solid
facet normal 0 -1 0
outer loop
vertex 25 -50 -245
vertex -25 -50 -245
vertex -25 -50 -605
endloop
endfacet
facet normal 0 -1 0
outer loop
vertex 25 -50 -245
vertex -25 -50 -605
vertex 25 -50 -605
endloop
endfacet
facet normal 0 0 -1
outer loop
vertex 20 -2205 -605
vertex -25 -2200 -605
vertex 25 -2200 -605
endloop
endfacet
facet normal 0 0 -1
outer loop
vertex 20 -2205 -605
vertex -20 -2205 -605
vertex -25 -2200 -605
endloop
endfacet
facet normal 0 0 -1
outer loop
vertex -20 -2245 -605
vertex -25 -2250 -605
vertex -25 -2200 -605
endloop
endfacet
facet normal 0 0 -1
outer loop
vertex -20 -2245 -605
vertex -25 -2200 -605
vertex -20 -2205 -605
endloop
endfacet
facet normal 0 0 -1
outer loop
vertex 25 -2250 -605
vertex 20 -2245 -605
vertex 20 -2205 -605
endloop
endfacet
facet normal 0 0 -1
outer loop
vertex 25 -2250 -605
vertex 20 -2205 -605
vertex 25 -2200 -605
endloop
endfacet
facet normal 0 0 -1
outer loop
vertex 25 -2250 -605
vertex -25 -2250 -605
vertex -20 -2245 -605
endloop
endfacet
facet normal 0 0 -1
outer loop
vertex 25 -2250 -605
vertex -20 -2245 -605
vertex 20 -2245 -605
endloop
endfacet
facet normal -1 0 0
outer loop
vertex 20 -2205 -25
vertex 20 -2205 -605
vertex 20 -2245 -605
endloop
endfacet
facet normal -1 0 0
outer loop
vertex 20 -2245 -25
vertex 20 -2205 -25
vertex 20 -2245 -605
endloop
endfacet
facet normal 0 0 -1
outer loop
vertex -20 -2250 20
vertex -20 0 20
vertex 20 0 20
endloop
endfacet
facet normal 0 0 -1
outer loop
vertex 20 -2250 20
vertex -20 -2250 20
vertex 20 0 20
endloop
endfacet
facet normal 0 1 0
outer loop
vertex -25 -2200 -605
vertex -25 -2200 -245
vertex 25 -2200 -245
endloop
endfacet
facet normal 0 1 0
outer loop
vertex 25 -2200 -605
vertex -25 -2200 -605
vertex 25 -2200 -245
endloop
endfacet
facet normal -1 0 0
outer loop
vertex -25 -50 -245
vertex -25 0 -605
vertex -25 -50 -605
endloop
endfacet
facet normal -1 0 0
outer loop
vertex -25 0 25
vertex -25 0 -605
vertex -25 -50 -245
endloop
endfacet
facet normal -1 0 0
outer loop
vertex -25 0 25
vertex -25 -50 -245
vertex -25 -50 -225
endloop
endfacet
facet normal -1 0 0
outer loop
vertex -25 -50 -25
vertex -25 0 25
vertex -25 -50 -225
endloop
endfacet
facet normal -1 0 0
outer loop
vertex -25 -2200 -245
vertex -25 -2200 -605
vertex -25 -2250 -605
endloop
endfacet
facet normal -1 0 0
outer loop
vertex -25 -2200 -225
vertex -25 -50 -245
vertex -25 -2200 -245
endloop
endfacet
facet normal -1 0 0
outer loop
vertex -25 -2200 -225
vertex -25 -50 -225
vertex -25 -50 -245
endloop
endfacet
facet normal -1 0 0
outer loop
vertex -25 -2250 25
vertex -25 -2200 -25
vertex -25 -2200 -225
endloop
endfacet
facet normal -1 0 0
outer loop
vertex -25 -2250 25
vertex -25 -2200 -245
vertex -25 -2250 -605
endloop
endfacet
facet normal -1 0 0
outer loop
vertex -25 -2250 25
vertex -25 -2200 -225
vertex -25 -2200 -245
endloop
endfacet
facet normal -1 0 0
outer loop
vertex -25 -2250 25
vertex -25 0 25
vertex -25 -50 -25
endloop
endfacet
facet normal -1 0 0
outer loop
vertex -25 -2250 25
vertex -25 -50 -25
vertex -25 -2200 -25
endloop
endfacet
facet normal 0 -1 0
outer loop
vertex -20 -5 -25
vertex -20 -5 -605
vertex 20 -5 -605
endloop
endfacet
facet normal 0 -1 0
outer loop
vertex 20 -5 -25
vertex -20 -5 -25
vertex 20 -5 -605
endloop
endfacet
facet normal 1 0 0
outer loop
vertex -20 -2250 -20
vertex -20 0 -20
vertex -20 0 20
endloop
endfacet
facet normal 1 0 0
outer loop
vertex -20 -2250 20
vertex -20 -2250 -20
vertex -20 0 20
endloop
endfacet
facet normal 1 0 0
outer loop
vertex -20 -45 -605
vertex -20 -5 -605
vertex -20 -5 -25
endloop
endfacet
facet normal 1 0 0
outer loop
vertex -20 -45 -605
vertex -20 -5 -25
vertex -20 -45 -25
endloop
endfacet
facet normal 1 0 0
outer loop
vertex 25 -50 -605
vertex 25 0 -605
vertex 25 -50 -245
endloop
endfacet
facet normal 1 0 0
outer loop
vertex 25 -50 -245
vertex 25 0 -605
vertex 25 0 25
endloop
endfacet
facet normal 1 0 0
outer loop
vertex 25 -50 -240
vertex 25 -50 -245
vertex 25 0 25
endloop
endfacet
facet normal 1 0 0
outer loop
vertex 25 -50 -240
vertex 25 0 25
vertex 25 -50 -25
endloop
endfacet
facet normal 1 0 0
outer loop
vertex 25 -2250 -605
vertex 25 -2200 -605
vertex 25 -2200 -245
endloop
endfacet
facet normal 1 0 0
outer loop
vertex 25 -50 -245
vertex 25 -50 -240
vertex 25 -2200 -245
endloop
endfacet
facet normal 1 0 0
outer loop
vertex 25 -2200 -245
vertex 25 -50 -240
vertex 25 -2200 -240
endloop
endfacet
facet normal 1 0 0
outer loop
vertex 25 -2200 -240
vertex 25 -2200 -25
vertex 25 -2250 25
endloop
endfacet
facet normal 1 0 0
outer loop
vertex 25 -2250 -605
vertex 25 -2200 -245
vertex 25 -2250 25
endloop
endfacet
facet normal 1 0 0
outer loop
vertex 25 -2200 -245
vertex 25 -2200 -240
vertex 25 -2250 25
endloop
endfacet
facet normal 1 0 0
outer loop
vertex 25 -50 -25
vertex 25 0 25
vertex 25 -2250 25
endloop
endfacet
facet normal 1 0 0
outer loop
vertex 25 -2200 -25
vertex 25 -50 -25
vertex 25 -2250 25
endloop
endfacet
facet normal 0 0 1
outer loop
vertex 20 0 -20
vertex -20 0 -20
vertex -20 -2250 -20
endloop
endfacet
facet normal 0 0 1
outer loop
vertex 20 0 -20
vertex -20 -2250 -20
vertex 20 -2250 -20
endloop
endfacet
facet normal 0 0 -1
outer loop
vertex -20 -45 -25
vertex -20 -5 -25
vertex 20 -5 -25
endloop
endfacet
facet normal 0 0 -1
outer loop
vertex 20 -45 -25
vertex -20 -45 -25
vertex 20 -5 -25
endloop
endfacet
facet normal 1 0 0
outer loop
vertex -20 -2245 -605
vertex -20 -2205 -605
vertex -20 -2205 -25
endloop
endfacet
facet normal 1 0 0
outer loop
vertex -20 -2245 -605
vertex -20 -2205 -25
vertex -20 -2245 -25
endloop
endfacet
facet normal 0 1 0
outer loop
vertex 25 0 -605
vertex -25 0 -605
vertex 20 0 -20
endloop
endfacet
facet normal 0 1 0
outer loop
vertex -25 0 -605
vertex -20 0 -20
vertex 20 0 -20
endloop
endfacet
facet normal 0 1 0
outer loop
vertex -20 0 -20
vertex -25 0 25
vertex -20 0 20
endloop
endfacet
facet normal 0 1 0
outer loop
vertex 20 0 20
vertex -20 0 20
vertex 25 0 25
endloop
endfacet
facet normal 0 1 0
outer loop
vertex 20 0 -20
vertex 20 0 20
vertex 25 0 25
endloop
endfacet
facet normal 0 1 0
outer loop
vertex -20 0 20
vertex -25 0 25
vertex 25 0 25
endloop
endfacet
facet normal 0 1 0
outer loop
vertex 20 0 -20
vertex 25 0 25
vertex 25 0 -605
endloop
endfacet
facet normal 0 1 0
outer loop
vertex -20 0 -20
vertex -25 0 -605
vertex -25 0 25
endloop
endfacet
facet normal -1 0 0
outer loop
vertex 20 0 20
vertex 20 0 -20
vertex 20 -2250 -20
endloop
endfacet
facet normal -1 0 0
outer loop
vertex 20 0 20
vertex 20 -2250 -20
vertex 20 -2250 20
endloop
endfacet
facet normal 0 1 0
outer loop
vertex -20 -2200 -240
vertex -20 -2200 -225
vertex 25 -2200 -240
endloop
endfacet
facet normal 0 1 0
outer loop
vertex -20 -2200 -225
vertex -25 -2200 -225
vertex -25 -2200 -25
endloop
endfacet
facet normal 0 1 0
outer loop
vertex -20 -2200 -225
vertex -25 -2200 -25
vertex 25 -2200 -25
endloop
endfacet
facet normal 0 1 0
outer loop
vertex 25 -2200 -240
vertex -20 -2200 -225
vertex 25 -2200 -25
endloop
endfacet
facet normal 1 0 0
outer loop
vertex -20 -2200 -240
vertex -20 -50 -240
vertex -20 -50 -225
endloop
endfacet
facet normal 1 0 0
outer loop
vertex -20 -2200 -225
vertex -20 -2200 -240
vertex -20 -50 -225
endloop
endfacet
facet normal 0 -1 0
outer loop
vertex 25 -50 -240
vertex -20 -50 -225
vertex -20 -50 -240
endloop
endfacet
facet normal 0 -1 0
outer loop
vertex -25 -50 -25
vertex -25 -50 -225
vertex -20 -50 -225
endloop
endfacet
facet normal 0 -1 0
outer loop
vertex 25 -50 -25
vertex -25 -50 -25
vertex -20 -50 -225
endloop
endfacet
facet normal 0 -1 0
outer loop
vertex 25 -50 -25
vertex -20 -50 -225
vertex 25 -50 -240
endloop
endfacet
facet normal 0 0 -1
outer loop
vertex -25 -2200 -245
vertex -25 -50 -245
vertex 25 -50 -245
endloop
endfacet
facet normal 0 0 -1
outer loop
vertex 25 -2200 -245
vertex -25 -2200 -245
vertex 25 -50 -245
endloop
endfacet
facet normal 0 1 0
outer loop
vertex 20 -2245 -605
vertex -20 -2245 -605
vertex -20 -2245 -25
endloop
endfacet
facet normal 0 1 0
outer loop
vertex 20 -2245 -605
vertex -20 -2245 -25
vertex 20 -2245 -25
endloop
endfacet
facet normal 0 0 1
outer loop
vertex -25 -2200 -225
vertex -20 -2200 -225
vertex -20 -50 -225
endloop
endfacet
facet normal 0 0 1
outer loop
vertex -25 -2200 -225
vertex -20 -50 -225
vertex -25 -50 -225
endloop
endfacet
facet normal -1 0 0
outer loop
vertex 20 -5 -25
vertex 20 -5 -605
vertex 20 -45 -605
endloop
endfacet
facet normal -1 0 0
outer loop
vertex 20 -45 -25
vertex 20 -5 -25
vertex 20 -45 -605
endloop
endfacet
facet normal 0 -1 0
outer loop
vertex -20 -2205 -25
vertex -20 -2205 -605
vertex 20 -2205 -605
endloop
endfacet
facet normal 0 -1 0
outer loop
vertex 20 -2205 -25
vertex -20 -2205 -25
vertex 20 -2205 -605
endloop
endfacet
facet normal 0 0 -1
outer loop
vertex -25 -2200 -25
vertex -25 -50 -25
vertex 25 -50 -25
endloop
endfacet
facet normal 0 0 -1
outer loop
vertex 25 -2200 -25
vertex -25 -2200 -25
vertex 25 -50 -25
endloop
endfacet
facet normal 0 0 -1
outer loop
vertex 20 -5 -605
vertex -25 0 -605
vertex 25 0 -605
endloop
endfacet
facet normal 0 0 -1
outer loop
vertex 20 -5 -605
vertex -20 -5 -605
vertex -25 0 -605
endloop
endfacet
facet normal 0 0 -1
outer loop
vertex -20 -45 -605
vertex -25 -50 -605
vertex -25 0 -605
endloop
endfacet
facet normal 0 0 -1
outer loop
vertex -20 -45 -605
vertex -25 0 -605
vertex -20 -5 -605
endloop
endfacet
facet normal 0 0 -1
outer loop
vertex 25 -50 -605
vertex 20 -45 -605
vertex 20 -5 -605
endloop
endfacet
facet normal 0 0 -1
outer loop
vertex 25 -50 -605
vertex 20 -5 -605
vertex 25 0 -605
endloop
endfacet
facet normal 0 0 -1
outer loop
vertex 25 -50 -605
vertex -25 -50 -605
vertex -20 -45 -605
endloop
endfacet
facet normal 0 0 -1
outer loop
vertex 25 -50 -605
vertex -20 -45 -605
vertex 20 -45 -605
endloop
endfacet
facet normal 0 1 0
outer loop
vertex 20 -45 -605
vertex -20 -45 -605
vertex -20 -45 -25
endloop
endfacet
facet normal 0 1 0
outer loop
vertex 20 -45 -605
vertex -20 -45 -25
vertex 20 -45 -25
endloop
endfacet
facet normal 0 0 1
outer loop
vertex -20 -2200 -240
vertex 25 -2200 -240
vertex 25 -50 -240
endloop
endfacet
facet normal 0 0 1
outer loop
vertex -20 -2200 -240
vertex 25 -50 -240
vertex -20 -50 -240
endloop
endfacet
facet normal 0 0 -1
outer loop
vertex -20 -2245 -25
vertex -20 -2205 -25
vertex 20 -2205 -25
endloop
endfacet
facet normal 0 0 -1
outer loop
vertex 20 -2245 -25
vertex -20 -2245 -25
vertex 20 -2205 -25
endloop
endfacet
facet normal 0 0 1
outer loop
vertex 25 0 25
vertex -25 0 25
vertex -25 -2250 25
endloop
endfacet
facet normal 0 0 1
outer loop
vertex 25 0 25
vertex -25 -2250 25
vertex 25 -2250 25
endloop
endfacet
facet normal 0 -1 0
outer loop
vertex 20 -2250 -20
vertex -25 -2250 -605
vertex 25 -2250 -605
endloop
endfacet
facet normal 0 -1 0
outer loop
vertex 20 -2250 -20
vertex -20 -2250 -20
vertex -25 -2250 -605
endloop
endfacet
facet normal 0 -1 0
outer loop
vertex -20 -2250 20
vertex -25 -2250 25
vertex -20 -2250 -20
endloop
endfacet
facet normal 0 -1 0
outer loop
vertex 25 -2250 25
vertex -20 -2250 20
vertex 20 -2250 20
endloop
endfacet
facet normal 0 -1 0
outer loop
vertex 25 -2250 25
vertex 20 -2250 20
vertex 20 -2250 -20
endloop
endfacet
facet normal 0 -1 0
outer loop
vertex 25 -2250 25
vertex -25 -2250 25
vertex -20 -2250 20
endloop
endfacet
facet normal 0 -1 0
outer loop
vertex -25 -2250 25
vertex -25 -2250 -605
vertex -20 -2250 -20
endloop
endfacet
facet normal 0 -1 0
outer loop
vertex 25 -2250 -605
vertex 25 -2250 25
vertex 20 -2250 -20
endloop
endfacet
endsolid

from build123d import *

# Parameters (mm, degrees)
F0_W     = 50
F0_H     = 50
F0_W_2   = 40
F0_H_2   = 40
F1_DEPTH = 2250
F2_W     = 50
F2_H     = 50
F2_W_2   = 40
F2_H_2   = 40
F3_DEPTH = 580
F5_DEPTH = 2150


with BuildPart() as f1:
    # F0 (on Front) → F1 (new body)
    with BuildSketch(Plane.XZ):
        Rectangle(F0_W, F0_H)
        Rectangle(F0_W_2, F0_H_2, mode=Mode.SUBTRACT)
    extrude(amount=F1_DEPTH)

    # F2 (on face) → F3 (join)
    with BuildSketch(Plane(origin=(0, 0, -25), x_dir=(1, 0, 0), z_dir=(0, 0, -1))):
        with Locations((0, 25)):
            Rectangle(F2_W, F2_H)
        with Locations((0, 25)):
            Rectangle(F2_W_2, F2_H_2, mode=Mode.SUBTRACT)
        with Locations((0, 2225)):
            Rectangle(F2_W, F2_H)
        with Locations((0, 2225)):
            Rectangle(F2_W_2, F2_H_2, mode=Mode.SUBTRACT)
    extrude(amount=F3_DEPTH)

    # F4 (on face) → F5 (join, through all)
    with BuildSketch(Plane.XZ.offset(50)):
        Polygon((-20, -225), (-25, -225), (-25, -245), (25, -245), (25, -240), (-20, -240), align=None)
    extrude(amount=F5_DEPTH)


solid = f1.part
